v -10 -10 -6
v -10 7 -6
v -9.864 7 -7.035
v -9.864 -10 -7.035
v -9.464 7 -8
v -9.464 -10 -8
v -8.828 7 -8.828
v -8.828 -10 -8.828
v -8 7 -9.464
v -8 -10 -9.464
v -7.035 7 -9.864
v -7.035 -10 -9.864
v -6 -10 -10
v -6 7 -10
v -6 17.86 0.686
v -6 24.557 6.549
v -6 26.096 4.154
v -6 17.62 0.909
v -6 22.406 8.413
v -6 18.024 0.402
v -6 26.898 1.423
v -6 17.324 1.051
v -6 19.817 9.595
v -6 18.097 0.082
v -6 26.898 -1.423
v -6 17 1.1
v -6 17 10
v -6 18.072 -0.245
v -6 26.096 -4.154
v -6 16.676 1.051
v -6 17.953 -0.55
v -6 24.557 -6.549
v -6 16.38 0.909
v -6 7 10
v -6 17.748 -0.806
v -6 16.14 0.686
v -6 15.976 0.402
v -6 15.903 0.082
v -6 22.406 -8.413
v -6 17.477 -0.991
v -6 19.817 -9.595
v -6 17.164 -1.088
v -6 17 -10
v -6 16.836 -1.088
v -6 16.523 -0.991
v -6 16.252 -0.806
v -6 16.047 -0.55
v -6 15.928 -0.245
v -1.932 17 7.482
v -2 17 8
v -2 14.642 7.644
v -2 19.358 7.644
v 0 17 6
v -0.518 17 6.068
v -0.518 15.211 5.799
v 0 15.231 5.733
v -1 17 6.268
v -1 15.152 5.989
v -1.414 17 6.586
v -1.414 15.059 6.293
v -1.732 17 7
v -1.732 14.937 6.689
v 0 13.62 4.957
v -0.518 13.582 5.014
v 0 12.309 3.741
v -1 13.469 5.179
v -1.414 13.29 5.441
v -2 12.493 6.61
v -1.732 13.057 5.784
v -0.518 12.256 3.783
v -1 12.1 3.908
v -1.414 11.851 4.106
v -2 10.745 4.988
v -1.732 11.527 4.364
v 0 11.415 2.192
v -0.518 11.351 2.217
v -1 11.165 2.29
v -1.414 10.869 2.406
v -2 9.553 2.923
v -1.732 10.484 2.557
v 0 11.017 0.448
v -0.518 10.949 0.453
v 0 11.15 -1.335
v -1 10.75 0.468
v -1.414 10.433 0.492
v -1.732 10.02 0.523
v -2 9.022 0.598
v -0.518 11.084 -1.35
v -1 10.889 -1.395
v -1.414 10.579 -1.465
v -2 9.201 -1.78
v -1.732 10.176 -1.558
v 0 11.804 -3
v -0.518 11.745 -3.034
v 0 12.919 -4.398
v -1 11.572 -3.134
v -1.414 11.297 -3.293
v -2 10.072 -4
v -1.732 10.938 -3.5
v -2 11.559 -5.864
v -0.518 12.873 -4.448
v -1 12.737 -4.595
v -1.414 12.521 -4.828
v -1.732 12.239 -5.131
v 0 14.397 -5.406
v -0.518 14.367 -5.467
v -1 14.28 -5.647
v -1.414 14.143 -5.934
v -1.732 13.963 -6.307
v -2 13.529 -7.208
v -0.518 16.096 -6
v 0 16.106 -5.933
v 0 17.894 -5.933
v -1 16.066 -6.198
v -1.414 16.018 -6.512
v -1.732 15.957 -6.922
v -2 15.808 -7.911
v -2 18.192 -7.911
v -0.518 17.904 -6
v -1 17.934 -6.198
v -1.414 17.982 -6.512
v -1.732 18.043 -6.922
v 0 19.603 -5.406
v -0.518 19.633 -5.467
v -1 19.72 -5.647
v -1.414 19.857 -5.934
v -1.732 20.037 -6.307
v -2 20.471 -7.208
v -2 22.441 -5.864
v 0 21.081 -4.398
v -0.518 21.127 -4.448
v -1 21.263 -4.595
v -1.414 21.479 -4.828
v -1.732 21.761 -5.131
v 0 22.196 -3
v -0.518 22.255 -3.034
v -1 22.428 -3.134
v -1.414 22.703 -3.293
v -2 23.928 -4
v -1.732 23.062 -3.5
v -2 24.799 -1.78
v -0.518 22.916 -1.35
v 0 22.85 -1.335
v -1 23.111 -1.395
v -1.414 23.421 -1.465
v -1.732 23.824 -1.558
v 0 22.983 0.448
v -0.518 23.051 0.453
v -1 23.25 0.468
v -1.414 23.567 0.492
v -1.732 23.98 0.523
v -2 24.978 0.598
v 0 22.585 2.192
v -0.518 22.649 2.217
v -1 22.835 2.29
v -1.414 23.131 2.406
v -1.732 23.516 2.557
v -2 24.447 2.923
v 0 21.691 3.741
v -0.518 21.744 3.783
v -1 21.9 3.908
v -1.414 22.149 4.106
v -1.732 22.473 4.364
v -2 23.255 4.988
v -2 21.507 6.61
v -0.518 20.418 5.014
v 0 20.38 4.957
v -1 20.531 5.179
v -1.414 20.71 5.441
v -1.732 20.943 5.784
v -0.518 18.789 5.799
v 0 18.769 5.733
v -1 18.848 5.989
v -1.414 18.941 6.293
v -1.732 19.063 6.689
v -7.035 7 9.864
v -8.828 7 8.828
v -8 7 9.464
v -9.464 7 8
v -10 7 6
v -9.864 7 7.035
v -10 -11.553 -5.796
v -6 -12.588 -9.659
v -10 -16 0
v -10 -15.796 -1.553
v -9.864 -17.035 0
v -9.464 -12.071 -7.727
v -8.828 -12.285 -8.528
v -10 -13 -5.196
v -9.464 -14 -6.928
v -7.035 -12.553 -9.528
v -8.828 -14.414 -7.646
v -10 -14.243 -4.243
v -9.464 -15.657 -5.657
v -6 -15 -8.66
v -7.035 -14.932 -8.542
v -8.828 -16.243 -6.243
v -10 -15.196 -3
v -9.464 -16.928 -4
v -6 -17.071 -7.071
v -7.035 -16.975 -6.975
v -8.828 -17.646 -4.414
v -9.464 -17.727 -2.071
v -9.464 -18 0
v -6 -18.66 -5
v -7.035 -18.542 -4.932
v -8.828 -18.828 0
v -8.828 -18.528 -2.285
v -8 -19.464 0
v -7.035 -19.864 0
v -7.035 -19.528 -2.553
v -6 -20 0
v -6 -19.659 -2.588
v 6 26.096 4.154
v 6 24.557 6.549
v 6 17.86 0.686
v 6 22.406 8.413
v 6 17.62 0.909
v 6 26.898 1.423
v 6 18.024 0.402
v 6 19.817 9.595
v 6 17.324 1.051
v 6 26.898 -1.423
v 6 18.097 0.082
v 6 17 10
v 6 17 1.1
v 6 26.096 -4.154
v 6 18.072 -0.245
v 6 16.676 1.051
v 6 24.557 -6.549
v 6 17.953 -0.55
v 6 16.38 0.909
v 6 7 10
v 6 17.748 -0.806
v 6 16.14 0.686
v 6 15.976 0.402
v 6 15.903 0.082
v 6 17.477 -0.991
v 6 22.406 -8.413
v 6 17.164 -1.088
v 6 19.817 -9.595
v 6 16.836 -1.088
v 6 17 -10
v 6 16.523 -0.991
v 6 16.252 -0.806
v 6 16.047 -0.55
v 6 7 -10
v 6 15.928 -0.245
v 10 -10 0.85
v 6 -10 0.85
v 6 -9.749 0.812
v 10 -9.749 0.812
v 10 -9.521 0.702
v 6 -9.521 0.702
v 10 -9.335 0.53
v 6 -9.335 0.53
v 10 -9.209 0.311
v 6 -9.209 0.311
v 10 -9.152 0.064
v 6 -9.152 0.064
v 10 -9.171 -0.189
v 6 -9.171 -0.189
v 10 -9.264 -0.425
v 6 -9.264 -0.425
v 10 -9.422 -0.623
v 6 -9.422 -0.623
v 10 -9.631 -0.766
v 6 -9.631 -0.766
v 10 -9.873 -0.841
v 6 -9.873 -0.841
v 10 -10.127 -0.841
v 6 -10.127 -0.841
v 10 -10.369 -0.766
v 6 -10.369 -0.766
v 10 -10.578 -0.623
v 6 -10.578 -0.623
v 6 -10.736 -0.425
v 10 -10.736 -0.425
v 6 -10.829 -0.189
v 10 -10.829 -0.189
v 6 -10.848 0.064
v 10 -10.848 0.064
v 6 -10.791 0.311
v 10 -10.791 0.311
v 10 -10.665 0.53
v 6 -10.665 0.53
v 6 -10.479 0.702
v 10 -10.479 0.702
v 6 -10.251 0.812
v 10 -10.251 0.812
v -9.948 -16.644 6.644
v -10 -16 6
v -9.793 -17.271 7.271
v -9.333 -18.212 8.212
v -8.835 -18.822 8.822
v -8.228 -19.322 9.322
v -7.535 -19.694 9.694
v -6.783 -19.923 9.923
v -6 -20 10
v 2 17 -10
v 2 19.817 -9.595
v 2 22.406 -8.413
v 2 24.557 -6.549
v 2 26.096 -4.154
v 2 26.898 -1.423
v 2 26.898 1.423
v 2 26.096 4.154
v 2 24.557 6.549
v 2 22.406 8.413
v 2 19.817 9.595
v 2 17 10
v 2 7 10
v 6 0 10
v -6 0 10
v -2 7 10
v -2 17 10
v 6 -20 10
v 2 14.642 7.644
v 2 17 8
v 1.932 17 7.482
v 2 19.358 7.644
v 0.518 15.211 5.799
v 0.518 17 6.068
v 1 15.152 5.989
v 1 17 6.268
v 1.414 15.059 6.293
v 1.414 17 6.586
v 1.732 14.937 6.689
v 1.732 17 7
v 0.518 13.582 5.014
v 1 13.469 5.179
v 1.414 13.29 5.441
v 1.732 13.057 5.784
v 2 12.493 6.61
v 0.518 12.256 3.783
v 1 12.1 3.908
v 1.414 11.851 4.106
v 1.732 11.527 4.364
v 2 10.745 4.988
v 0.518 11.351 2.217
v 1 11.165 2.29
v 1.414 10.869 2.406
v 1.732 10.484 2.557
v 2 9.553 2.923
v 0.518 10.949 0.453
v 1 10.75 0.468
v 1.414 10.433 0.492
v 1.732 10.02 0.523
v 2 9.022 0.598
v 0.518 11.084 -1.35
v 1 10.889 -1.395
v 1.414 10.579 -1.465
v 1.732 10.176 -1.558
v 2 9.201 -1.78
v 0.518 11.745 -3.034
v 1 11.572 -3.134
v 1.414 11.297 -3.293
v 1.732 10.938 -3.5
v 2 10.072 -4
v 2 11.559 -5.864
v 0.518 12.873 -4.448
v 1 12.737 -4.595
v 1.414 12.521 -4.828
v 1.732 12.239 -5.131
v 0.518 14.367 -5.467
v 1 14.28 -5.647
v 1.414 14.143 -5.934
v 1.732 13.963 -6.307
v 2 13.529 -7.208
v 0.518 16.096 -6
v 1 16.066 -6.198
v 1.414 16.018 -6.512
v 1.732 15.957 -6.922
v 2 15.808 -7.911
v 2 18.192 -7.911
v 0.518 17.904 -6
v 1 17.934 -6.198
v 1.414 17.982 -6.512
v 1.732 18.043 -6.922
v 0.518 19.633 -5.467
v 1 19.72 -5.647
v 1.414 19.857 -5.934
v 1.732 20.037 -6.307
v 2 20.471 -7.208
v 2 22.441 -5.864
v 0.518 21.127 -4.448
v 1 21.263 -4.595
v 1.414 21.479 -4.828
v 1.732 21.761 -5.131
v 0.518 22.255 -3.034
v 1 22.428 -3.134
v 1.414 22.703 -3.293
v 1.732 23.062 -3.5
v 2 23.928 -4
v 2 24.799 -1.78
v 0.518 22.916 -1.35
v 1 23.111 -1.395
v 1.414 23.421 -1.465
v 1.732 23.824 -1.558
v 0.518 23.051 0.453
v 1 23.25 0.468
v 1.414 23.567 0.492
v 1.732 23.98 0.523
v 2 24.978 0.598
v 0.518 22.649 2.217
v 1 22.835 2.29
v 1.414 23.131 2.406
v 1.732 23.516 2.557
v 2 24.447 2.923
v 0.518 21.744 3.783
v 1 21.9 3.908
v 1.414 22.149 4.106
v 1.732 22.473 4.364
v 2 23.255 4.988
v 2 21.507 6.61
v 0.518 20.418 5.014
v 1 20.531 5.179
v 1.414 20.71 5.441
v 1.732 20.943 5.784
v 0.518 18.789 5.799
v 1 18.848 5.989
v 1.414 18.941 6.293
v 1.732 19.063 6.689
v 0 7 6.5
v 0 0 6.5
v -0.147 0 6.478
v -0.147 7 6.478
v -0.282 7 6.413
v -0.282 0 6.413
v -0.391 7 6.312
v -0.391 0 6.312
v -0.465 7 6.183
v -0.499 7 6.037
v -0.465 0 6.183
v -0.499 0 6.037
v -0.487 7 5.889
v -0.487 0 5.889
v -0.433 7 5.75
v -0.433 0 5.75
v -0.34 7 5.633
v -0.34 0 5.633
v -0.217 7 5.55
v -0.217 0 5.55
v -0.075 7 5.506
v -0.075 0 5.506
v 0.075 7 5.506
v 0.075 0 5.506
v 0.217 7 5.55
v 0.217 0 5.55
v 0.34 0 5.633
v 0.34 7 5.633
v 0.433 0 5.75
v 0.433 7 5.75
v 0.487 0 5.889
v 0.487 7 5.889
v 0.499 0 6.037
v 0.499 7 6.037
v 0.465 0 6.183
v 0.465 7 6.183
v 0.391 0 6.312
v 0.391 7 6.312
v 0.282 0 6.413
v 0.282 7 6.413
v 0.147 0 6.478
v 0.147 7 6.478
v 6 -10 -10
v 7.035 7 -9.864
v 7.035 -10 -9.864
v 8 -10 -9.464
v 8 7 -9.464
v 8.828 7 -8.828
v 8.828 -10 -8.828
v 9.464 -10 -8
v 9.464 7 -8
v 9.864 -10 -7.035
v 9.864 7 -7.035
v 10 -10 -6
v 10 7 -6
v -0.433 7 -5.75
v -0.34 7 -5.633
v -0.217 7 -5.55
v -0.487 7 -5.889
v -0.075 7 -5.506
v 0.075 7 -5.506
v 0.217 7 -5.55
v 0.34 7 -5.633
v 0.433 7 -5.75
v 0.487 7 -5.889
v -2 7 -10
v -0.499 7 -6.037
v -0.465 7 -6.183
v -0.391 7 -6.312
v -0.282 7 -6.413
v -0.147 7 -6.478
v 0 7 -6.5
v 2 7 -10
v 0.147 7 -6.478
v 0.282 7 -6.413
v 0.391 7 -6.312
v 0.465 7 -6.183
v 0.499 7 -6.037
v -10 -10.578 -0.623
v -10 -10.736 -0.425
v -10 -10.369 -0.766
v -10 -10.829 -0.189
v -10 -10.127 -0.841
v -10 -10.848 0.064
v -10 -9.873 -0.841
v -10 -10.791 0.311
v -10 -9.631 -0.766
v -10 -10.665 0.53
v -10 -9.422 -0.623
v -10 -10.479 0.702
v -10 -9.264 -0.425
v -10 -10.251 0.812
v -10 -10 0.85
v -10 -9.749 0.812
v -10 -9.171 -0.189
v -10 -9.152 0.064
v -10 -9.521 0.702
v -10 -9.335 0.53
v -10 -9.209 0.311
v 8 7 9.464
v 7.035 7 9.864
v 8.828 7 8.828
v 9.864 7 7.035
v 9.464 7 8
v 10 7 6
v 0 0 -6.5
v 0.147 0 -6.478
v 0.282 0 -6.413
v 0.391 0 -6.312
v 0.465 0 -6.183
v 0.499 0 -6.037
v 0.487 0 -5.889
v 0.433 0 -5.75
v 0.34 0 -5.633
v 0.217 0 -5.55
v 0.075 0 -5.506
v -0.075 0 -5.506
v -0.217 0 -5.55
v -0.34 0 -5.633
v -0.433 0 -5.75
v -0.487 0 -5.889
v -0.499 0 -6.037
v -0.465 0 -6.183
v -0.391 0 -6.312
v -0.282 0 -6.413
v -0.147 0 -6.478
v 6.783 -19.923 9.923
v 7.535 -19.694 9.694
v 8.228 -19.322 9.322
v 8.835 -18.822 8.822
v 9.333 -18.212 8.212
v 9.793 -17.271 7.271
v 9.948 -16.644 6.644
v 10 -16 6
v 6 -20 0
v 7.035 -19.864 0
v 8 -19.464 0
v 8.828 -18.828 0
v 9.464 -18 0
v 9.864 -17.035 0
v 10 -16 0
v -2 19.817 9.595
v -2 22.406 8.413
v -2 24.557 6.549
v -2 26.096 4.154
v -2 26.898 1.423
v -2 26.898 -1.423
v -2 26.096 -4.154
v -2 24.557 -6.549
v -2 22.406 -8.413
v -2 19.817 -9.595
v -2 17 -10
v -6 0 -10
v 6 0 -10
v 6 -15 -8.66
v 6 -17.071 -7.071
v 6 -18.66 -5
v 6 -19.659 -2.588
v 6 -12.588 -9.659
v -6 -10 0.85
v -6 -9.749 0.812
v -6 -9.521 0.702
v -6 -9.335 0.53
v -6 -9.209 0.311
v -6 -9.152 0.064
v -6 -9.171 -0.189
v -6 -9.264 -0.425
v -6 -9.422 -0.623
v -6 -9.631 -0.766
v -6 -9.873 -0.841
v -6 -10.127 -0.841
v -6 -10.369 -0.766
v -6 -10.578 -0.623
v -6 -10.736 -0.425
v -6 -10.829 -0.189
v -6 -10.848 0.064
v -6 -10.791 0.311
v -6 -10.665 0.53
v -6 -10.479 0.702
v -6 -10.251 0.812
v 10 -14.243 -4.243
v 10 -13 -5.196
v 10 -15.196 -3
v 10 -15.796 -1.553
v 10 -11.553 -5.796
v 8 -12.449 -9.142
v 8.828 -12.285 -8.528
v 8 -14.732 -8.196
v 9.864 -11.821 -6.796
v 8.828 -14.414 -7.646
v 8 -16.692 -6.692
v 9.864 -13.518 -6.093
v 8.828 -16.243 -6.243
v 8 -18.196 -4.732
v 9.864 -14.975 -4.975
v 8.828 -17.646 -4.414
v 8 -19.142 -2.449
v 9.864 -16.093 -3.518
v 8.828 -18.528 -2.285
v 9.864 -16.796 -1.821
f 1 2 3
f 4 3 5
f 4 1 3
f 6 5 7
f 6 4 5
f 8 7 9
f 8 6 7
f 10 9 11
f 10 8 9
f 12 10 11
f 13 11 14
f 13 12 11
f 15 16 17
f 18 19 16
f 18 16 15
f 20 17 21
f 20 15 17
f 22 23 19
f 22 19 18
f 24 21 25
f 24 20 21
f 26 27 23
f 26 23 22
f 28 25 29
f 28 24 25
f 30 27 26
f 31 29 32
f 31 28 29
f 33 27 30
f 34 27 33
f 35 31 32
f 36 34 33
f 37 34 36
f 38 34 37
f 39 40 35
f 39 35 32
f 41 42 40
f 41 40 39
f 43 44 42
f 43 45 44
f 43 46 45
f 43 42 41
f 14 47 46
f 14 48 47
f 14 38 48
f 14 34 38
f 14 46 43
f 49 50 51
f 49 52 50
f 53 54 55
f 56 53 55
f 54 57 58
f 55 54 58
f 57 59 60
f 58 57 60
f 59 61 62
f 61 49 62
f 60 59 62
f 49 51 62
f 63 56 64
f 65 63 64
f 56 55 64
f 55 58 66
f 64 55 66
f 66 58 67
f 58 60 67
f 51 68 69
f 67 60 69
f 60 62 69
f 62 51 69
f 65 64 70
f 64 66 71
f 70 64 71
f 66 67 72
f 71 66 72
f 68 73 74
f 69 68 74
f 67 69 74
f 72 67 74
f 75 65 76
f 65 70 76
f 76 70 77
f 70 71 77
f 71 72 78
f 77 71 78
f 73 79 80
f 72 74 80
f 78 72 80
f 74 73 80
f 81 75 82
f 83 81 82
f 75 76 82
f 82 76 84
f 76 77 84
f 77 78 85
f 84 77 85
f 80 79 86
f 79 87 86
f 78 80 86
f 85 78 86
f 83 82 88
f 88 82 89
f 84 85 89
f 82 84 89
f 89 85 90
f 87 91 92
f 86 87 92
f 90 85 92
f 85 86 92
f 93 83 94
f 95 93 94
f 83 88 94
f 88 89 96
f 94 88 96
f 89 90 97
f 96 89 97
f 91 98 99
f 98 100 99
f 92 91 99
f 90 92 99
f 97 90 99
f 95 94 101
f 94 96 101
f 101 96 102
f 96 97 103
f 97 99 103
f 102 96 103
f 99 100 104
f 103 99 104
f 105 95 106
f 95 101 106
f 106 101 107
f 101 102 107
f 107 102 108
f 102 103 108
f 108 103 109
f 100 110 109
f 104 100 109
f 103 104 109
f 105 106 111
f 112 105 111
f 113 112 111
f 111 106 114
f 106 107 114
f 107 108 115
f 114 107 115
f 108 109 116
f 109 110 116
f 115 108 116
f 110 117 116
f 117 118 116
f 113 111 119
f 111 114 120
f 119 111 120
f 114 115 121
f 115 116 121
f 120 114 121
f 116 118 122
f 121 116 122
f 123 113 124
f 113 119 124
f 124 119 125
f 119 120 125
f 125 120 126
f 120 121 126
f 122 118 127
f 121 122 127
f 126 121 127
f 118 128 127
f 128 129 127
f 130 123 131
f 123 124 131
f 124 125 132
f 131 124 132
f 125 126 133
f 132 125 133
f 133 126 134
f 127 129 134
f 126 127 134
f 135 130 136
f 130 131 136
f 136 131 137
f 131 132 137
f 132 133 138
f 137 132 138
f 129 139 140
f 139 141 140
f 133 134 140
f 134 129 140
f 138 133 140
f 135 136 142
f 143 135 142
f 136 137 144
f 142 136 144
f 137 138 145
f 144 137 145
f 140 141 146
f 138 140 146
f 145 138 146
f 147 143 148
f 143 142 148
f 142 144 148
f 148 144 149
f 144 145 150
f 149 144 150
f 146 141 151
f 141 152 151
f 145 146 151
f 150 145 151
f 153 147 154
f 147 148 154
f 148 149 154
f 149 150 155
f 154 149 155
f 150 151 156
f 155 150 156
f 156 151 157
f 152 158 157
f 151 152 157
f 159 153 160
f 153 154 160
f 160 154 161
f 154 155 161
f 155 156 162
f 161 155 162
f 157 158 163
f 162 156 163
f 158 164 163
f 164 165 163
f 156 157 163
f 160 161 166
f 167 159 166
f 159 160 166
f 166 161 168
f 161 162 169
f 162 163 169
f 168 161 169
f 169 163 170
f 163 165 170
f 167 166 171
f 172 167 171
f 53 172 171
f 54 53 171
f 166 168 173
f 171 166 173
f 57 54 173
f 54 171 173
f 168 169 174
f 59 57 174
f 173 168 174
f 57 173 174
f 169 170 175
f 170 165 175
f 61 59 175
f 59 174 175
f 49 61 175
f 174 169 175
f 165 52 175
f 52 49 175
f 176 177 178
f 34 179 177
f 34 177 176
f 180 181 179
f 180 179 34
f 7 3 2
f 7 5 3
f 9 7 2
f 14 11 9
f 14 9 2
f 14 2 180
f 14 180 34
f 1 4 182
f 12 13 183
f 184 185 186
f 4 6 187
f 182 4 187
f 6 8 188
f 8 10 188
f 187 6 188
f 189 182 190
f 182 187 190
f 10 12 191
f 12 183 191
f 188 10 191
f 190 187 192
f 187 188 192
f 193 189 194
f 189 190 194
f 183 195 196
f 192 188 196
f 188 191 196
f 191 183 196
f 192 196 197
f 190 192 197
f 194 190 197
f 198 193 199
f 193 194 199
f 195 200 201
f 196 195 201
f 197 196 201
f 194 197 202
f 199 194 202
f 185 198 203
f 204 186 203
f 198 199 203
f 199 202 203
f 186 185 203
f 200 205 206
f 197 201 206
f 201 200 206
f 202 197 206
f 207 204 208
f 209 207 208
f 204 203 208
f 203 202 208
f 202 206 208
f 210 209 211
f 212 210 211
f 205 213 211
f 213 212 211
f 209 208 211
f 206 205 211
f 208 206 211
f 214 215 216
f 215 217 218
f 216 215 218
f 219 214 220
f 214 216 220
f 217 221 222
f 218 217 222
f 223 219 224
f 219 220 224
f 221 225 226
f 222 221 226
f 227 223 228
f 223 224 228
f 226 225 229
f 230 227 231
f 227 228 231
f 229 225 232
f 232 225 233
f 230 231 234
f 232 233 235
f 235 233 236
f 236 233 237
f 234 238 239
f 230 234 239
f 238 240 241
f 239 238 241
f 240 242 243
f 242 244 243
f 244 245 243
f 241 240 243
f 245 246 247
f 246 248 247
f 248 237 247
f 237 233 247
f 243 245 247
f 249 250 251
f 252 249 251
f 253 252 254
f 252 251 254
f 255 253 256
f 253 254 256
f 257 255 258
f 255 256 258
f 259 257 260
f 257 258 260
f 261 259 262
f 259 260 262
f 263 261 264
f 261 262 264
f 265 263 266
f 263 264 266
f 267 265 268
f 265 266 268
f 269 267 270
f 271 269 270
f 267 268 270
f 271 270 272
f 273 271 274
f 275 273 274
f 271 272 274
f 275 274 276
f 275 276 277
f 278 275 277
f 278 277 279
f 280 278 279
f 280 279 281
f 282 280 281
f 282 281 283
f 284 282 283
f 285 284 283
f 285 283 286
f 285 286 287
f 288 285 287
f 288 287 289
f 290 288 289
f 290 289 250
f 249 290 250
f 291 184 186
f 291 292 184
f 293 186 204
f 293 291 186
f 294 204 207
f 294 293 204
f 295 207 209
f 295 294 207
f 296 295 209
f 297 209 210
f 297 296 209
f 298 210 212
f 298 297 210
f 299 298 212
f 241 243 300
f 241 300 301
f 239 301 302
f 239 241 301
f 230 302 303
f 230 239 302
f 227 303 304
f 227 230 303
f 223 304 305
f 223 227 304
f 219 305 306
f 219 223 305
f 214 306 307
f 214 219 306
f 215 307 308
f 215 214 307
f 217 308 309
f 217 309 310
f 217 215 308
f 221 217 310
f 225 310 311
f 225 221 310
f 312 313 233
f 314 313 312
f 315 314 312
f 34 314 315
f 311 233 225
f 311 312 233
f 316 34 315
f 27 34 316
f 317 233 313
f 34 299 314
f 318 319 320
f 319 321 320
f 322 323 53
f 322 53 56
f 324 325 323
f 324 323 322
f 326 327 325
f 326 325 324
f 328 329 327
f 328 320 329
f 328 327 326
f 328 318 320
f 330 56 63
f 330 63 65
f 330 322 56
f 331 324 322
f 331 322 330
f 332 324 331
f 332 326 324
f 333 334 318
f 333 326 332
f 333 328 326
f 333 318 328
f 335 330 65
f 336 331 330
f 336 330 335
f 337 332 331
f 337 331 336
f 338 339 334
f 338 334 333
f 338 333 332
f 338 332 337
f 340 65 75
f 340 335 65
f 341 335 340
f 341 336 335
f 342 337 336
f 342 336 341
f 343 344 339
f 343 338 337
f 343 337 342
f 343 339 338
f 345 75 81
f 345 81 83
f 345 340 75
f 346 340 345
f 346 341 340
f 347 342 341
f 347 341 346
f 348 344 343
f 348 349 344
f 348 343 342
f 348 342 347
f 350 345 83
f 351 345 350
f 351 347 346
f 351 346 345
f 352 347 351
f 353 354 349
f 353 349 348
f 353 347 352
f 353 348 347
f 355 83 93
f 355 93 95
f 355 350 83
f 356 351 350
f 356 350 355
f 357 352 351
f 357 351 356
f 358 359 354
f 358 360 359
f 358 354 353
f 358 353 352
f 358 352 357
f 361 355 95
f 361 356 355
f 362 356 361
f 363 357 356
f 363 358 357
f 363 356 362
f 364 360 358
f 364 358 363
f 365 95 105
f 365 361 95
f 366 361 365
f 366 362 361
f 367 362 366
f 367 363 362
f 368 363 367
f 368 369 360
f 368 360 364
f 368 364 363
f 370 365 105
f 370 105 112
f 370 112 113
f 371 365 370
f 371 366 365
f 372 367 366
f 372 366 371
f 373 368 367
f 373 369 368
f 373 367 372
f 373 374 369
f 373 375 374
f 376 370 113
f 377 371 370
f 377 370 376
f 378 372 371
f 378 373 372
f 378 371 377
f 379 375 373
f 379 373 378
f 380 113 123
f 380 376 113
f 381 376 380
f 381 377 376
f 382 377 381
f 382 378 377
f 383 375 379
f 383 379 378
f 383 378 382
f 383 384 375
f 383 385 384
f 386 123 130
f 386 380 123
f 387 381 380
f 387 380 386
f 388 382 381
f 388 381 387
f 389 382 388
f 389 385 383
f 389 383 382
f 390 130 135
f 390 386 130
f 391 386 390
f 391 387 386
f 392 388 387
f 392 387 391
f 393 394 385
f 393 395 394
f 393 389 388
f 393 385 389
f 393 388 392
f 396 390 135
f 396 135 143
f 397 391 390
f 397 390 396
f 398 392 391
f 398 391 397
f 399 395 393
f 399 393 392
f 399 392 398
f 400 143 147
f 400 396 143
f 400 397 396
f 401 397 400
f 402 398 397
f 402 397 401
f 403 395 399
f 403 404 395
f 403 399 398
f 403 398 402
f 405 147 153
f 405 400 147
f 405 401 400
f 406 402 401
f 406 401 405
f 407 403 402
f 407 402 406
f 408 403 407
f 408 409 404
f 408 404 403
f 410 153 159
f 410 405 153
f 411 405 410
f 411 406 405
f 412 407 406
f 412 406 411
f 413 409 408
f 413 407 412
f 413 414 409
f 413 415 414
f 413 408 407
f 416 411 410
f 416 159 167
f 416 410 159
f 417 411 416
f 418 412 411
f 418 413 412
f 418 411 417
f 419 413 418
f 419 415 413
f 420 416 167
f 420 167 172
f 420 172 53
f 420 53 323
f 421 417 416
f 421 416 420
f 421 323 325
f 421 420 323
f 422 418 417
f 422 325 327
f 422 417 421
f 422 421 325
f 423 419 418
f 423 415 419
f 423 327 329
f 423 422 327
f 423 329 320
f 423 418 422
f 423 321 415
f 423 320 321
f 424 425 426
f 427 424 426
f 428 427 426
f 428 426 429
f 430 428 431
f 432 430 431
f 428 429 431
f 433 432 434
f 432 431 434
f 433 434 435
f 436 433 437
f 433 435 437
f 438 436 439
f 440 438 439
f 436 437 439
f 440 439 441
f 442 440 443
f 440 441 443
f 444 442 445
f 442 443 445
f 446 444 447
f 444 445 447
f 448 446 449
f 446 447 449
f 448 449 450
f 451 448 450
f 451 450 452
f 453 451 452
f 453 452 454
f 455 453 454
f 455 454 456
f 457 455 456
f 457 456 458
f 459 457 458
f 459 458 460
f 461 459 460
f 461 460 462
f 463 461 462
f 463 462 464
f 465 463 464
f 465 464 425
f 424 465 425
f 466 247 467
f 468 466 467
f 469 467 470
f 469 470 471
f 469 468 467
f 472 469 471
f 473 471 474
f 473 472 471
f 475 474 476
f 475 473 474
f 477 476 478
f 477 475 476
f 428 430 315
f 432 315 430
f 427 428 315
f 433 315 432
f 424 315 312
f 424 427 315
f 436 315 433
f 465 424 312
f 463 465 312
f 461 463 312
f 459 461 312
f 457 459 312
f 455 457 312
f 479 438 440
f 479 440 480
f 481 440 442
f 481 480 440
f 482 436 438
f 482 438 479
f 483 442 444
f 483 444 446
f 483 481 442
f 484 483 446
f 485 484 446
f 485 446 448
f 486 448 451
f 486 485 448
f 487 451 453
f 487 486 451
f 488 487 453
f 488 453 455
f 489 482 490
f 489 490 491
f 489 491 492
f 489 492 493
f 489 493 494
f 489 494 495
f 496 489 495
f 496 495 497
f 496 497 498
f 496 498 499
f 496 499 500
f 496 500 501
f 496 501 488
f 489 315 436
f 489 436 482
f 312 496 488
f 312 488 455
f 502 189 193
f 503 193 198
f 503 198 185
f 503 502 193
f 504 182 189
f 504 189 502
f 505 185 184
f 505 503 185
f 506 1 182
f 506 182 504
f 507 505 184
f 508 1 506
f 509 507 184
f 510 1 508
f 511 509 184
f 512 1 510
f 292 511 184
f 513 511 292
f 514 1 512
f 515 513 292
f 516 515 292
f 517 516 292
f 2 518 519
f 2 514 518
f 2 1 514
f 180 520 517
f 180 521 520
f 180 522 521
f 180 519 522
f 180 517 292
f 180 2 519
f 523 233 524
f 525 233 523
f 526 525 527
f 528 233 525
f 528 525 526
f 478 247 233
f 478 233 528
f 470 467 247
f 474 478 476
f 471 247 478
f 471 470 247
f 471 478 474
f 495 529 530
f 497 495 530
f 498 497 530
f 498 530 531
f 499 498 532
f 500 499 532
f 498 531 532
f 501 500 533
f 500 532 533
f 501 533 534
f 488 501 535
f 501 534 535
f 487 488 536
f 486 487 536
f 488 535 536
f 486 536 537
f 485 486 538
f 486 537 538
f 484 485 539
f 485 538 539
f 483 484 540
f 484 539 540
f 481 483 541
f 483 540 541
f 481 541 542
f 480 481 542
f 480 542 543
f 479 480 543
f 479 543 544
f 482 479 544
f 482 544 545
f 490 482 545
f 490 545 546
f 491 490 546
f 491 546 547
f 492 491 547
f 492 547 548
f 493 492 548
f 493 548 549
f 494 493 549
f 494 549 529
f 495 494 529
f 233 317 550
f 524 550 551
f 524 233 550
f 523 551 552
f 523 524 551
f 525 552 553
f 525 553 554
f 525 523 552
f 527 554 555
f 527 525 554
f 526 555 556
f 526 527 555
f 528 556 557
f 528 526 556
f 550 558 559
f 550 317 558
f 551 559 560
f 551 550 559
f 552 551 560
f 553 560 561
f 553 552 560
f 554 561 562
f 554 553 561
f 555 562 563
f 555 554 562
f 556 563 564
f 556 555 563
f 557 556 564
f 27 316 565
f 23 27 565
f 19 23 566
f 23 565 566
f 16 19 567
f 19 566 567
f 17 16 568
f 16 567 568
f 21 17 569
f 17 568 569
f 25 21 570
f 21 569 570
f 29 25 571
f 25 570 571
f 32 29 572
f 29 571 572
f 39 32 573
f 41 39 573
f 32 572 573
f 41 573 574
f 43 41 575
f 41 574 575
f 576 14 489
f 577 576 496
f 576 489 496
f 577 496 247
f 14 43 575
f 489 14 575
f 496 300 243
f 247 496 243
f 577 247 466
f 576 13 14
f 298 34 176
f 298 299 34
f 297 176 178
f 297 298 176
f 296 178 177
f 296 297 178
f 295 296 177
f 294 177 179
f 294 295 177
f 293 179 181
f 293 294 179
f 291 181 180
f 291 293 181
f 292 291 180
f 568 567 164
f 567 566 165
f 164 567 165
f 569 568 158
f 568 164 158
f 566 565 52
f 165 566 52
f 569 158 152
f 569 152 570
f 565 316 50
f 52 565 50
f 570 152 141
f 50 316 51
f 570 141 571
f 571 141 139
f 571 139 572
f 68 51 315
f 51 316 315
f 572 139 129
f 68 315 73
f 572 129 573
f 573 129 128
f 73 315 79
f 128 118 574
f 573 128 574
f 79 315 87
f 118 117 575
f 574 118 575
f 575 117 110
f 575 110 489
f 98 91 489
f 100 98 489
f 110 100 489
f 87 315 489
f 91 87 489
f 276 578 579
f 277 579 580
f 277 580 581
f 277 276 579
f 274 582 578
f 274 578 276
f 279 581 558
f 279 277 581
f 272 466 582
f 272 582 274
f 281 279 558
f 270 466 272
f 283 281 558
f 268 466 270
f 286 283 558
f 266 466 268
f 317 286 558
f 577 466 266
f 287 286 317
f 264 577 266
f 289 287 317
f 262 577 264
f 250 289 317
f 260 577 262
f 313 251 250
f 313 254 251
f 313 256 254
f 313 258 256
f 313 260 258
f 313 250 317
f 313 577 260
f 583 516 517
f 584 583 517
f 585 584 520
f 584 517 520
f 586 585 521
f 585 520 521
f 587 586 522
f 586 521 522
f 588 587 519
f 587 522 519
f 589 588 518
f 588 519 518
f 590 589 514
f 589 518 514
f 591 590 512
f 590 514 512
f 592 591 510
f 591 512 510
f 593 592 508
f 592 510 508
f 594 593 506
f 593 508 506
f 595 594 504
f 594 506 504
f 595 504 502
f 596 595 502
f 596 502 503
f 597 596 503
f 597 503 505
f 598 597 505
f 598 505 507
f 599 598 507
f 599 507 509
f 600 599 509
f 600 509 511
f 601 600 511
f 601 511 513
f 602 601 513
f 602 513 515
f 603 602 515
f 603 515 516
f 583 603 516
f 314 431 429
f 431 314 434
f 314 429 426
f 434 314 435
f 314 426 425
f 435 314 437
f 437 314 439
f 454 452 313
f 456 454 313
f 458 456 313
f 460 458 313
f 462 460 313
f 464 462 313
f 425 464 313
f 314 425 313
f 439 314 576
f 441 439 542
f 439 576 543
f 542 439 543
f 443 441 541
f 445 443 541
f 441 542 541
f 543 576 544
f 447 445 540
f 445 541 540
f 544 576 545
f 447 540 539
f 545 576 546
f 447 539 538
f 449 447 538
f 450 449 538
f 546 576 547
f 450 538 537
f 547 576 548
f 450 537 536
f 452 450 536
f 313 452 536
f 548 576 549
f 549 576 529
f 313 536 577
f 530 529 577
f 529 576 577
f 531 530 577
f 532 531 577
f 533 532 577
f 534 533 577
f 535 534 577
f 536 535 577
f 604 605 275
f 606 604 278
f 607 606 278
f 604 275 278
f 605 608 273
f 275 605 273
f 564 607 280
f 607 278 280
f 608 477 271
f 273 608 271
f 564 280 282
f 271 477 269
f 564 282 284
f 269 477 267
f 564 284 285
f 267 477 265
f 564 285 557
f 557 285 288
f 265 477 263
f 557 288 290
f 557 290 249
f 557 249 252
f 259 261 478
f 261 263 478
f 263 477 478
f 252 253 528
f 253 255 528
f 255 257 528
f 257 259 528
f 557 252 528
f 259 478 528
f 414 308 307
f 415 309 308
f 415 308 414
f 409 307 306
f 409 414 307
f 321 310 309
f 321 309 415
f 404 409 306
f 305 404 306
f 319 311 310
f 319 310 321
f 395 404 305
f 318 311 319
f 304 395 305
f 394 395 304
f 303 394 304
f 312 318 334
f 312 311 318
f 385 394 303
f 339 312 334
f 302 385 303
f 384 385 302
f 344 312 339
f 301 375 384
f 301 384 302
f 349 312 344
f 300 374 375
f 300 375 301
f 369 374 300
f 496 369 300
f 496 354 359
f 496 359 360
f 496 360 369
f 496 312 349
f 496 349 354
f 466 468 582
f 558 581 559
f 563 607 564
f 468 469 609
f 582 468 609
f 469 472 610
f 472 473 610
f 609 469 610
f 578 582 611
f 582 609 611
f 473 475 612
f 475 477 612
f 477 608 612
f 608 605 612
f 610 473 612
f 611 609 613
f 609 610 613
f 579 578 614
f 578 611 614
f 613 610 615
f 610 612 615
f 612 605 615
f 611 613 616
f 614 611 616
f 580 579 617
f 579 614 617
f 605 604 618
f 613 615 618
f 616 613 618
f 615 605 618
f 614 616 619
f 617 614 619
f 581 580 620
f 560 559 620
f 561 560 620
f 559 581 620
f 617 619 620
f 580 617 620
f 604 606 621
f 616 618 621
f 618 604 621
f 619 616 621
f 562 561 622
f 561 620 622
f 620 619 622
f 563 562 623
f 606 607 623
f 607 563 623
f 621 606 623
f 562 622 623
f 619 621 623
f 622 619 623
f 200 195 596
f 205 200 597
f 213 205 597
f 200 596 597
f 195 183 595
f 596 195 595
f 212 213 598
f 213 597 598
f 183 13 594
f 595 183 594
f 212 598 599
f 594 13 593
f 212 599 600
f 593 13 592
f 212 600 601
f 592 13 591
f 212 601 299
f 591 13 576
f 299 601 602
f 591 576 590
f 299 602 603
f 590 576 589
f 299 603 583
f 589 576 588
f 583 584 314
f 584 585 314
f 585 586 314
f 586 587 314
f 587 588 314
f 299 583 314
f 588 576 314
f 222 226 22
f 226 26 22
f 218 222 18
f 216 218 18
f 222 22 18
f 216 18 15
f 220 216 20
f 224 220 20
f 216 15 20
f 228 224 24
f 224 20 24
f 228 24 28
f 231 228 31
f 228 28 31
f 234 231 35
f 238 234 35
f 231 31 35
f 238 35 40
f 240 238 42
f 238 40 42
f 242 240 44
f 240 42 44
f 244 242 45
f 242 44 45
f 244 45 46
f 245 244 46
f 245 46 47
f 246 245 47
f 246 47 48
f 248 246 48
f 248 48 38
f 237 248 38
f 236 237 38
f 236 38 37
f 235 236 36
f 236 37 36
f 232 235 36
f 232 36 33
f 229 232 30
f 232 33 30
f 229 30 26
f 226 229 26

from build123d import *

# Parameters (mm, degrees)
SKETCH1_W           = 20
SKETCH1_H           = 20
BOSS_EXTRUDE1_DEPTH = 7
SKETCH4_W           = 4
SKETCH4_H           = 20
BOSS_EXTRUDE2_DEPTH = 10
BOSS_EXTRUDE3_DEPTH = 4
BOSS_EXTRUDE4_START = -4
BOSS_EXTRUDE4_DEPTH = 4
SKETCH7_R           = 0.85
CUT_EXTRUDE1_DEPTH  = 31
FILLET1_R           = 4
SKETCH8_W           = 4
SKETCH8_H           = 20
BOSS_EXTRUDE5_DEPTH = 10
SKETCH9_R           = 10
BOSS_EXTRUDE6_DEPTH = 4
BOSS_EXTRUDE7_START = -4
SKETCH10_R          = 10
BOSS_EXTRUDE7_DEPTH = 4
SKETCH12_R          = 1.1
CUT_EXTRUDE2_DEPTH  = 33.939338184
SKETCH13_R          = 6
BOSS_EXTRUDE8_DEPTH = 4
SKETCH14_R          = 1.1
CUT_EXTRUDE3_DEPTH  = 4
FILLET2_R           = 2
CUT_EXTRUDE4_REACH  = 32.48
SKETCH16_R          = 0.5


with BuildPart() as part:
    # Sketch1 → Boss-Extrude1 (new body)
    with BuildSketch(Plane(origin=(0, 0, 0), x_dir=(1, 0, 0), z_dir=(0, 1, 0))):
        Rectangle(SKETCH1_W, SKETCH1_H)
    extrude(amount=BOSS_EXTRUDE1_DEPTH)

    # Sketch4 → Boss-Extrude2 (add)
    with BuildSketch(Plane.XZ):
        with Locations((-8, 0)):
            Rectangle(SKETCH4_W, SKETCH4_H)
        with Locations((8, 0)):
            Rectangle(SKETCH4_W, SKETCH4_H)
    extrude(amount=BOSS_EXTRUDE2_DEPTH)

    # Sketch5 → Boss-Extrude3 (add)
    with BuildSketch(Plane.ZY.offset(10)):
        with BuildLine():
            Line((0, -20), (10, -20))
            Line((10, -20), (10, -10))
            ThreePointArc((10, -10), (-7.071067812, -2.928932188), (0, -20))
        make_face()
    extrude(amount=-BOSS_EXTRUDE3_DEPTH)

    # Sketch6 → Boss-Extrude4 (add)
    with BuildSketch(Plane(origin=(10, 0, 0), x_dir=(0, 0, -1), z_dir=(1, 0, 0)).offset(BOSS_EXTRUDE4_START)):
        with BuildLine():
            Line((0, -20), (-10, -20))
            Line((-10, -20), (-10, -10))
            ThreePointArc((-10, -10), (7.071067812, -2.928932188), (0, -20))
        make_face()
    extrude(amount=BOSS_EXTRUDE4_DEPTH)

    # Sketch7 → Cut-Extrude1 (cut, through all)
    with BuildSketch(Plane.ZY.offset(10)):
        with Locations((0, -10)):
            Circle(SKETCH7_R)
    extrude(amount=-CUT_EXTRUDE1_DEPTH, mode=Mode.SUBTRACT)

    # Fillet1
    fillet1_edges = [part.edges().sort_by_distance(p)[0] for p in [
        (-10, -6.5, 10),
        (-10, -17.071067812, -7.071067812),
        (10, -6.5, 10),
        (10, -17.071067812, -7.071067812),
        (-10, -1.5, -10),
        (10, -1.5, -10),
        (10, -20, 5),
        (-10, -20, 5),
    ]]
    fillet(fillet1_edges, radius=FILLET1_R - 0.0001)  # a hair under: the kernel refuses the full size

    # Sketch8 → Boss-Extrude5 (add)
    with BuildSketch(Plane(origin=(0, 7, 0), x_dir=(1, 0, 0), z_dir=(0, 1, 0))):
        with Locations((4, 0)):
            Rectangle(SKETCH8_W, SKETCH8_H)
        with Locations((-4, 0)):
            Rectangle(SKETCH8_W, SKETCH8_H)
    extrude(amount=BOSS_EXTRUDE5_DEPTH)

    # Sketch9 → Boss-Extrude6 (add)
    with BuildSketch(Plane(origin=(6, 0, 0), x_dir=(0, 0, -1), z_dir=(1, 0, 0))):
        with Locations((0, 17)):
            Circle(SKETCH9_R)
    extrude(amount=-BOSS_EXTRUDE6_DEPTH)

    # Sketch10 → Boss-Extrude7 (add)
    with BuildSketch(Plane.ZY.offset(6).offset(BOSS_EXTRUDE7_START)):
        with Locations((0, 17)):
            Circle(SKETCH10_R)
    extrude(amount=BOSS_EXTRUDE7_DEPTH)

    # Sketch12 → Cut-Extrude2 (cut, through all)
    with BuildSketch(Plane.ZY.offset(6)):
        with Locations((0, 17)):
            Circle(SKETCH12_R)
    extrude(amount=-CUT_EXTRUDE2_DEPTH, mode=Mode.SUBTRACT)

    # Sketch13 → Boss-Extrude8 (add)
    with BuildSketch(Plane(origin=(-2, 0, 0), x_dir=(0, 0, -1), z_dir=(1, 0, 0))):
        with Locations(Location((0, 17, 0), (0, 0, 180))):
            Circle(SKETCH13_R)
    extrude(amount=BOSS_EXTRUDE8_DEPTH)

    # Sketch14 → Cut-Extrude3 (cut)
    with BuildSketch(Plane(origin=(-2, 0, 0), x_dir=(0, 0, -1), z_dir=(1, 0, 0))):
        with Locations(Location((0, 17, 0), (0, 0, 180))):
            Circle(SKETCH14_R)
    extrude(amount=CUT_EXTRUDE3_DEPTH, mode=Mode.SUBTRACT)

    # Fillet2
    fillet2_edges = [part.edges().sort_by_distance(p)[0] for p in [
        (-2, 17, -6),
        (2, 17, -6),
    ]]
    fillet(fillet2_edges, radius=FILLET2_R - 0.0001)  # a hair under: the kernel refuses the full size

    # Sketch16 → Cut-Extrude4 (cut, up to next)
    with BuildSketch(Plane.XZ, mode=Mode.PRIVATE) as cut_extrude4_sk1:
        with Locations(Location((0, -6, 0), (0, 0, 270))):
            Circle(SKETCH16_R)
    cut_extrude4_tool1 = extrude(cut_extrude4_sk1.sketch, amount=-CUT_EXTRUDE4_REACH, mode=Mode.PRIVATE) & part.part
    # Sketch16 → Cut-Extrude4 (cut, up to next)
    with BuildSketch(Plane.XZ, mode=Mode.PRIVATE) as cut_extrude4_sk2:
        with Locations(Location((0, 6, 0), (0, 0, 90))):
            Circle(SKETCH16_R)
    cut_extrude4_tool2 = extrude(cut_extrude4_sk2.sketch, amount=-CUT_EXTRUDE4_REACH, mode=Mode.PRIVATE) & part.part
    add(cut_extrude4_tool1.solids().sort_by_distance((0, 0, -6))[0], mode=Mode.SUBTRACT)
    add(cut_extrude4_tool2.solids().sort_by_distance((0, 0, 6))[0], mode=Mode.SUBTRACT)


solid = part.part
